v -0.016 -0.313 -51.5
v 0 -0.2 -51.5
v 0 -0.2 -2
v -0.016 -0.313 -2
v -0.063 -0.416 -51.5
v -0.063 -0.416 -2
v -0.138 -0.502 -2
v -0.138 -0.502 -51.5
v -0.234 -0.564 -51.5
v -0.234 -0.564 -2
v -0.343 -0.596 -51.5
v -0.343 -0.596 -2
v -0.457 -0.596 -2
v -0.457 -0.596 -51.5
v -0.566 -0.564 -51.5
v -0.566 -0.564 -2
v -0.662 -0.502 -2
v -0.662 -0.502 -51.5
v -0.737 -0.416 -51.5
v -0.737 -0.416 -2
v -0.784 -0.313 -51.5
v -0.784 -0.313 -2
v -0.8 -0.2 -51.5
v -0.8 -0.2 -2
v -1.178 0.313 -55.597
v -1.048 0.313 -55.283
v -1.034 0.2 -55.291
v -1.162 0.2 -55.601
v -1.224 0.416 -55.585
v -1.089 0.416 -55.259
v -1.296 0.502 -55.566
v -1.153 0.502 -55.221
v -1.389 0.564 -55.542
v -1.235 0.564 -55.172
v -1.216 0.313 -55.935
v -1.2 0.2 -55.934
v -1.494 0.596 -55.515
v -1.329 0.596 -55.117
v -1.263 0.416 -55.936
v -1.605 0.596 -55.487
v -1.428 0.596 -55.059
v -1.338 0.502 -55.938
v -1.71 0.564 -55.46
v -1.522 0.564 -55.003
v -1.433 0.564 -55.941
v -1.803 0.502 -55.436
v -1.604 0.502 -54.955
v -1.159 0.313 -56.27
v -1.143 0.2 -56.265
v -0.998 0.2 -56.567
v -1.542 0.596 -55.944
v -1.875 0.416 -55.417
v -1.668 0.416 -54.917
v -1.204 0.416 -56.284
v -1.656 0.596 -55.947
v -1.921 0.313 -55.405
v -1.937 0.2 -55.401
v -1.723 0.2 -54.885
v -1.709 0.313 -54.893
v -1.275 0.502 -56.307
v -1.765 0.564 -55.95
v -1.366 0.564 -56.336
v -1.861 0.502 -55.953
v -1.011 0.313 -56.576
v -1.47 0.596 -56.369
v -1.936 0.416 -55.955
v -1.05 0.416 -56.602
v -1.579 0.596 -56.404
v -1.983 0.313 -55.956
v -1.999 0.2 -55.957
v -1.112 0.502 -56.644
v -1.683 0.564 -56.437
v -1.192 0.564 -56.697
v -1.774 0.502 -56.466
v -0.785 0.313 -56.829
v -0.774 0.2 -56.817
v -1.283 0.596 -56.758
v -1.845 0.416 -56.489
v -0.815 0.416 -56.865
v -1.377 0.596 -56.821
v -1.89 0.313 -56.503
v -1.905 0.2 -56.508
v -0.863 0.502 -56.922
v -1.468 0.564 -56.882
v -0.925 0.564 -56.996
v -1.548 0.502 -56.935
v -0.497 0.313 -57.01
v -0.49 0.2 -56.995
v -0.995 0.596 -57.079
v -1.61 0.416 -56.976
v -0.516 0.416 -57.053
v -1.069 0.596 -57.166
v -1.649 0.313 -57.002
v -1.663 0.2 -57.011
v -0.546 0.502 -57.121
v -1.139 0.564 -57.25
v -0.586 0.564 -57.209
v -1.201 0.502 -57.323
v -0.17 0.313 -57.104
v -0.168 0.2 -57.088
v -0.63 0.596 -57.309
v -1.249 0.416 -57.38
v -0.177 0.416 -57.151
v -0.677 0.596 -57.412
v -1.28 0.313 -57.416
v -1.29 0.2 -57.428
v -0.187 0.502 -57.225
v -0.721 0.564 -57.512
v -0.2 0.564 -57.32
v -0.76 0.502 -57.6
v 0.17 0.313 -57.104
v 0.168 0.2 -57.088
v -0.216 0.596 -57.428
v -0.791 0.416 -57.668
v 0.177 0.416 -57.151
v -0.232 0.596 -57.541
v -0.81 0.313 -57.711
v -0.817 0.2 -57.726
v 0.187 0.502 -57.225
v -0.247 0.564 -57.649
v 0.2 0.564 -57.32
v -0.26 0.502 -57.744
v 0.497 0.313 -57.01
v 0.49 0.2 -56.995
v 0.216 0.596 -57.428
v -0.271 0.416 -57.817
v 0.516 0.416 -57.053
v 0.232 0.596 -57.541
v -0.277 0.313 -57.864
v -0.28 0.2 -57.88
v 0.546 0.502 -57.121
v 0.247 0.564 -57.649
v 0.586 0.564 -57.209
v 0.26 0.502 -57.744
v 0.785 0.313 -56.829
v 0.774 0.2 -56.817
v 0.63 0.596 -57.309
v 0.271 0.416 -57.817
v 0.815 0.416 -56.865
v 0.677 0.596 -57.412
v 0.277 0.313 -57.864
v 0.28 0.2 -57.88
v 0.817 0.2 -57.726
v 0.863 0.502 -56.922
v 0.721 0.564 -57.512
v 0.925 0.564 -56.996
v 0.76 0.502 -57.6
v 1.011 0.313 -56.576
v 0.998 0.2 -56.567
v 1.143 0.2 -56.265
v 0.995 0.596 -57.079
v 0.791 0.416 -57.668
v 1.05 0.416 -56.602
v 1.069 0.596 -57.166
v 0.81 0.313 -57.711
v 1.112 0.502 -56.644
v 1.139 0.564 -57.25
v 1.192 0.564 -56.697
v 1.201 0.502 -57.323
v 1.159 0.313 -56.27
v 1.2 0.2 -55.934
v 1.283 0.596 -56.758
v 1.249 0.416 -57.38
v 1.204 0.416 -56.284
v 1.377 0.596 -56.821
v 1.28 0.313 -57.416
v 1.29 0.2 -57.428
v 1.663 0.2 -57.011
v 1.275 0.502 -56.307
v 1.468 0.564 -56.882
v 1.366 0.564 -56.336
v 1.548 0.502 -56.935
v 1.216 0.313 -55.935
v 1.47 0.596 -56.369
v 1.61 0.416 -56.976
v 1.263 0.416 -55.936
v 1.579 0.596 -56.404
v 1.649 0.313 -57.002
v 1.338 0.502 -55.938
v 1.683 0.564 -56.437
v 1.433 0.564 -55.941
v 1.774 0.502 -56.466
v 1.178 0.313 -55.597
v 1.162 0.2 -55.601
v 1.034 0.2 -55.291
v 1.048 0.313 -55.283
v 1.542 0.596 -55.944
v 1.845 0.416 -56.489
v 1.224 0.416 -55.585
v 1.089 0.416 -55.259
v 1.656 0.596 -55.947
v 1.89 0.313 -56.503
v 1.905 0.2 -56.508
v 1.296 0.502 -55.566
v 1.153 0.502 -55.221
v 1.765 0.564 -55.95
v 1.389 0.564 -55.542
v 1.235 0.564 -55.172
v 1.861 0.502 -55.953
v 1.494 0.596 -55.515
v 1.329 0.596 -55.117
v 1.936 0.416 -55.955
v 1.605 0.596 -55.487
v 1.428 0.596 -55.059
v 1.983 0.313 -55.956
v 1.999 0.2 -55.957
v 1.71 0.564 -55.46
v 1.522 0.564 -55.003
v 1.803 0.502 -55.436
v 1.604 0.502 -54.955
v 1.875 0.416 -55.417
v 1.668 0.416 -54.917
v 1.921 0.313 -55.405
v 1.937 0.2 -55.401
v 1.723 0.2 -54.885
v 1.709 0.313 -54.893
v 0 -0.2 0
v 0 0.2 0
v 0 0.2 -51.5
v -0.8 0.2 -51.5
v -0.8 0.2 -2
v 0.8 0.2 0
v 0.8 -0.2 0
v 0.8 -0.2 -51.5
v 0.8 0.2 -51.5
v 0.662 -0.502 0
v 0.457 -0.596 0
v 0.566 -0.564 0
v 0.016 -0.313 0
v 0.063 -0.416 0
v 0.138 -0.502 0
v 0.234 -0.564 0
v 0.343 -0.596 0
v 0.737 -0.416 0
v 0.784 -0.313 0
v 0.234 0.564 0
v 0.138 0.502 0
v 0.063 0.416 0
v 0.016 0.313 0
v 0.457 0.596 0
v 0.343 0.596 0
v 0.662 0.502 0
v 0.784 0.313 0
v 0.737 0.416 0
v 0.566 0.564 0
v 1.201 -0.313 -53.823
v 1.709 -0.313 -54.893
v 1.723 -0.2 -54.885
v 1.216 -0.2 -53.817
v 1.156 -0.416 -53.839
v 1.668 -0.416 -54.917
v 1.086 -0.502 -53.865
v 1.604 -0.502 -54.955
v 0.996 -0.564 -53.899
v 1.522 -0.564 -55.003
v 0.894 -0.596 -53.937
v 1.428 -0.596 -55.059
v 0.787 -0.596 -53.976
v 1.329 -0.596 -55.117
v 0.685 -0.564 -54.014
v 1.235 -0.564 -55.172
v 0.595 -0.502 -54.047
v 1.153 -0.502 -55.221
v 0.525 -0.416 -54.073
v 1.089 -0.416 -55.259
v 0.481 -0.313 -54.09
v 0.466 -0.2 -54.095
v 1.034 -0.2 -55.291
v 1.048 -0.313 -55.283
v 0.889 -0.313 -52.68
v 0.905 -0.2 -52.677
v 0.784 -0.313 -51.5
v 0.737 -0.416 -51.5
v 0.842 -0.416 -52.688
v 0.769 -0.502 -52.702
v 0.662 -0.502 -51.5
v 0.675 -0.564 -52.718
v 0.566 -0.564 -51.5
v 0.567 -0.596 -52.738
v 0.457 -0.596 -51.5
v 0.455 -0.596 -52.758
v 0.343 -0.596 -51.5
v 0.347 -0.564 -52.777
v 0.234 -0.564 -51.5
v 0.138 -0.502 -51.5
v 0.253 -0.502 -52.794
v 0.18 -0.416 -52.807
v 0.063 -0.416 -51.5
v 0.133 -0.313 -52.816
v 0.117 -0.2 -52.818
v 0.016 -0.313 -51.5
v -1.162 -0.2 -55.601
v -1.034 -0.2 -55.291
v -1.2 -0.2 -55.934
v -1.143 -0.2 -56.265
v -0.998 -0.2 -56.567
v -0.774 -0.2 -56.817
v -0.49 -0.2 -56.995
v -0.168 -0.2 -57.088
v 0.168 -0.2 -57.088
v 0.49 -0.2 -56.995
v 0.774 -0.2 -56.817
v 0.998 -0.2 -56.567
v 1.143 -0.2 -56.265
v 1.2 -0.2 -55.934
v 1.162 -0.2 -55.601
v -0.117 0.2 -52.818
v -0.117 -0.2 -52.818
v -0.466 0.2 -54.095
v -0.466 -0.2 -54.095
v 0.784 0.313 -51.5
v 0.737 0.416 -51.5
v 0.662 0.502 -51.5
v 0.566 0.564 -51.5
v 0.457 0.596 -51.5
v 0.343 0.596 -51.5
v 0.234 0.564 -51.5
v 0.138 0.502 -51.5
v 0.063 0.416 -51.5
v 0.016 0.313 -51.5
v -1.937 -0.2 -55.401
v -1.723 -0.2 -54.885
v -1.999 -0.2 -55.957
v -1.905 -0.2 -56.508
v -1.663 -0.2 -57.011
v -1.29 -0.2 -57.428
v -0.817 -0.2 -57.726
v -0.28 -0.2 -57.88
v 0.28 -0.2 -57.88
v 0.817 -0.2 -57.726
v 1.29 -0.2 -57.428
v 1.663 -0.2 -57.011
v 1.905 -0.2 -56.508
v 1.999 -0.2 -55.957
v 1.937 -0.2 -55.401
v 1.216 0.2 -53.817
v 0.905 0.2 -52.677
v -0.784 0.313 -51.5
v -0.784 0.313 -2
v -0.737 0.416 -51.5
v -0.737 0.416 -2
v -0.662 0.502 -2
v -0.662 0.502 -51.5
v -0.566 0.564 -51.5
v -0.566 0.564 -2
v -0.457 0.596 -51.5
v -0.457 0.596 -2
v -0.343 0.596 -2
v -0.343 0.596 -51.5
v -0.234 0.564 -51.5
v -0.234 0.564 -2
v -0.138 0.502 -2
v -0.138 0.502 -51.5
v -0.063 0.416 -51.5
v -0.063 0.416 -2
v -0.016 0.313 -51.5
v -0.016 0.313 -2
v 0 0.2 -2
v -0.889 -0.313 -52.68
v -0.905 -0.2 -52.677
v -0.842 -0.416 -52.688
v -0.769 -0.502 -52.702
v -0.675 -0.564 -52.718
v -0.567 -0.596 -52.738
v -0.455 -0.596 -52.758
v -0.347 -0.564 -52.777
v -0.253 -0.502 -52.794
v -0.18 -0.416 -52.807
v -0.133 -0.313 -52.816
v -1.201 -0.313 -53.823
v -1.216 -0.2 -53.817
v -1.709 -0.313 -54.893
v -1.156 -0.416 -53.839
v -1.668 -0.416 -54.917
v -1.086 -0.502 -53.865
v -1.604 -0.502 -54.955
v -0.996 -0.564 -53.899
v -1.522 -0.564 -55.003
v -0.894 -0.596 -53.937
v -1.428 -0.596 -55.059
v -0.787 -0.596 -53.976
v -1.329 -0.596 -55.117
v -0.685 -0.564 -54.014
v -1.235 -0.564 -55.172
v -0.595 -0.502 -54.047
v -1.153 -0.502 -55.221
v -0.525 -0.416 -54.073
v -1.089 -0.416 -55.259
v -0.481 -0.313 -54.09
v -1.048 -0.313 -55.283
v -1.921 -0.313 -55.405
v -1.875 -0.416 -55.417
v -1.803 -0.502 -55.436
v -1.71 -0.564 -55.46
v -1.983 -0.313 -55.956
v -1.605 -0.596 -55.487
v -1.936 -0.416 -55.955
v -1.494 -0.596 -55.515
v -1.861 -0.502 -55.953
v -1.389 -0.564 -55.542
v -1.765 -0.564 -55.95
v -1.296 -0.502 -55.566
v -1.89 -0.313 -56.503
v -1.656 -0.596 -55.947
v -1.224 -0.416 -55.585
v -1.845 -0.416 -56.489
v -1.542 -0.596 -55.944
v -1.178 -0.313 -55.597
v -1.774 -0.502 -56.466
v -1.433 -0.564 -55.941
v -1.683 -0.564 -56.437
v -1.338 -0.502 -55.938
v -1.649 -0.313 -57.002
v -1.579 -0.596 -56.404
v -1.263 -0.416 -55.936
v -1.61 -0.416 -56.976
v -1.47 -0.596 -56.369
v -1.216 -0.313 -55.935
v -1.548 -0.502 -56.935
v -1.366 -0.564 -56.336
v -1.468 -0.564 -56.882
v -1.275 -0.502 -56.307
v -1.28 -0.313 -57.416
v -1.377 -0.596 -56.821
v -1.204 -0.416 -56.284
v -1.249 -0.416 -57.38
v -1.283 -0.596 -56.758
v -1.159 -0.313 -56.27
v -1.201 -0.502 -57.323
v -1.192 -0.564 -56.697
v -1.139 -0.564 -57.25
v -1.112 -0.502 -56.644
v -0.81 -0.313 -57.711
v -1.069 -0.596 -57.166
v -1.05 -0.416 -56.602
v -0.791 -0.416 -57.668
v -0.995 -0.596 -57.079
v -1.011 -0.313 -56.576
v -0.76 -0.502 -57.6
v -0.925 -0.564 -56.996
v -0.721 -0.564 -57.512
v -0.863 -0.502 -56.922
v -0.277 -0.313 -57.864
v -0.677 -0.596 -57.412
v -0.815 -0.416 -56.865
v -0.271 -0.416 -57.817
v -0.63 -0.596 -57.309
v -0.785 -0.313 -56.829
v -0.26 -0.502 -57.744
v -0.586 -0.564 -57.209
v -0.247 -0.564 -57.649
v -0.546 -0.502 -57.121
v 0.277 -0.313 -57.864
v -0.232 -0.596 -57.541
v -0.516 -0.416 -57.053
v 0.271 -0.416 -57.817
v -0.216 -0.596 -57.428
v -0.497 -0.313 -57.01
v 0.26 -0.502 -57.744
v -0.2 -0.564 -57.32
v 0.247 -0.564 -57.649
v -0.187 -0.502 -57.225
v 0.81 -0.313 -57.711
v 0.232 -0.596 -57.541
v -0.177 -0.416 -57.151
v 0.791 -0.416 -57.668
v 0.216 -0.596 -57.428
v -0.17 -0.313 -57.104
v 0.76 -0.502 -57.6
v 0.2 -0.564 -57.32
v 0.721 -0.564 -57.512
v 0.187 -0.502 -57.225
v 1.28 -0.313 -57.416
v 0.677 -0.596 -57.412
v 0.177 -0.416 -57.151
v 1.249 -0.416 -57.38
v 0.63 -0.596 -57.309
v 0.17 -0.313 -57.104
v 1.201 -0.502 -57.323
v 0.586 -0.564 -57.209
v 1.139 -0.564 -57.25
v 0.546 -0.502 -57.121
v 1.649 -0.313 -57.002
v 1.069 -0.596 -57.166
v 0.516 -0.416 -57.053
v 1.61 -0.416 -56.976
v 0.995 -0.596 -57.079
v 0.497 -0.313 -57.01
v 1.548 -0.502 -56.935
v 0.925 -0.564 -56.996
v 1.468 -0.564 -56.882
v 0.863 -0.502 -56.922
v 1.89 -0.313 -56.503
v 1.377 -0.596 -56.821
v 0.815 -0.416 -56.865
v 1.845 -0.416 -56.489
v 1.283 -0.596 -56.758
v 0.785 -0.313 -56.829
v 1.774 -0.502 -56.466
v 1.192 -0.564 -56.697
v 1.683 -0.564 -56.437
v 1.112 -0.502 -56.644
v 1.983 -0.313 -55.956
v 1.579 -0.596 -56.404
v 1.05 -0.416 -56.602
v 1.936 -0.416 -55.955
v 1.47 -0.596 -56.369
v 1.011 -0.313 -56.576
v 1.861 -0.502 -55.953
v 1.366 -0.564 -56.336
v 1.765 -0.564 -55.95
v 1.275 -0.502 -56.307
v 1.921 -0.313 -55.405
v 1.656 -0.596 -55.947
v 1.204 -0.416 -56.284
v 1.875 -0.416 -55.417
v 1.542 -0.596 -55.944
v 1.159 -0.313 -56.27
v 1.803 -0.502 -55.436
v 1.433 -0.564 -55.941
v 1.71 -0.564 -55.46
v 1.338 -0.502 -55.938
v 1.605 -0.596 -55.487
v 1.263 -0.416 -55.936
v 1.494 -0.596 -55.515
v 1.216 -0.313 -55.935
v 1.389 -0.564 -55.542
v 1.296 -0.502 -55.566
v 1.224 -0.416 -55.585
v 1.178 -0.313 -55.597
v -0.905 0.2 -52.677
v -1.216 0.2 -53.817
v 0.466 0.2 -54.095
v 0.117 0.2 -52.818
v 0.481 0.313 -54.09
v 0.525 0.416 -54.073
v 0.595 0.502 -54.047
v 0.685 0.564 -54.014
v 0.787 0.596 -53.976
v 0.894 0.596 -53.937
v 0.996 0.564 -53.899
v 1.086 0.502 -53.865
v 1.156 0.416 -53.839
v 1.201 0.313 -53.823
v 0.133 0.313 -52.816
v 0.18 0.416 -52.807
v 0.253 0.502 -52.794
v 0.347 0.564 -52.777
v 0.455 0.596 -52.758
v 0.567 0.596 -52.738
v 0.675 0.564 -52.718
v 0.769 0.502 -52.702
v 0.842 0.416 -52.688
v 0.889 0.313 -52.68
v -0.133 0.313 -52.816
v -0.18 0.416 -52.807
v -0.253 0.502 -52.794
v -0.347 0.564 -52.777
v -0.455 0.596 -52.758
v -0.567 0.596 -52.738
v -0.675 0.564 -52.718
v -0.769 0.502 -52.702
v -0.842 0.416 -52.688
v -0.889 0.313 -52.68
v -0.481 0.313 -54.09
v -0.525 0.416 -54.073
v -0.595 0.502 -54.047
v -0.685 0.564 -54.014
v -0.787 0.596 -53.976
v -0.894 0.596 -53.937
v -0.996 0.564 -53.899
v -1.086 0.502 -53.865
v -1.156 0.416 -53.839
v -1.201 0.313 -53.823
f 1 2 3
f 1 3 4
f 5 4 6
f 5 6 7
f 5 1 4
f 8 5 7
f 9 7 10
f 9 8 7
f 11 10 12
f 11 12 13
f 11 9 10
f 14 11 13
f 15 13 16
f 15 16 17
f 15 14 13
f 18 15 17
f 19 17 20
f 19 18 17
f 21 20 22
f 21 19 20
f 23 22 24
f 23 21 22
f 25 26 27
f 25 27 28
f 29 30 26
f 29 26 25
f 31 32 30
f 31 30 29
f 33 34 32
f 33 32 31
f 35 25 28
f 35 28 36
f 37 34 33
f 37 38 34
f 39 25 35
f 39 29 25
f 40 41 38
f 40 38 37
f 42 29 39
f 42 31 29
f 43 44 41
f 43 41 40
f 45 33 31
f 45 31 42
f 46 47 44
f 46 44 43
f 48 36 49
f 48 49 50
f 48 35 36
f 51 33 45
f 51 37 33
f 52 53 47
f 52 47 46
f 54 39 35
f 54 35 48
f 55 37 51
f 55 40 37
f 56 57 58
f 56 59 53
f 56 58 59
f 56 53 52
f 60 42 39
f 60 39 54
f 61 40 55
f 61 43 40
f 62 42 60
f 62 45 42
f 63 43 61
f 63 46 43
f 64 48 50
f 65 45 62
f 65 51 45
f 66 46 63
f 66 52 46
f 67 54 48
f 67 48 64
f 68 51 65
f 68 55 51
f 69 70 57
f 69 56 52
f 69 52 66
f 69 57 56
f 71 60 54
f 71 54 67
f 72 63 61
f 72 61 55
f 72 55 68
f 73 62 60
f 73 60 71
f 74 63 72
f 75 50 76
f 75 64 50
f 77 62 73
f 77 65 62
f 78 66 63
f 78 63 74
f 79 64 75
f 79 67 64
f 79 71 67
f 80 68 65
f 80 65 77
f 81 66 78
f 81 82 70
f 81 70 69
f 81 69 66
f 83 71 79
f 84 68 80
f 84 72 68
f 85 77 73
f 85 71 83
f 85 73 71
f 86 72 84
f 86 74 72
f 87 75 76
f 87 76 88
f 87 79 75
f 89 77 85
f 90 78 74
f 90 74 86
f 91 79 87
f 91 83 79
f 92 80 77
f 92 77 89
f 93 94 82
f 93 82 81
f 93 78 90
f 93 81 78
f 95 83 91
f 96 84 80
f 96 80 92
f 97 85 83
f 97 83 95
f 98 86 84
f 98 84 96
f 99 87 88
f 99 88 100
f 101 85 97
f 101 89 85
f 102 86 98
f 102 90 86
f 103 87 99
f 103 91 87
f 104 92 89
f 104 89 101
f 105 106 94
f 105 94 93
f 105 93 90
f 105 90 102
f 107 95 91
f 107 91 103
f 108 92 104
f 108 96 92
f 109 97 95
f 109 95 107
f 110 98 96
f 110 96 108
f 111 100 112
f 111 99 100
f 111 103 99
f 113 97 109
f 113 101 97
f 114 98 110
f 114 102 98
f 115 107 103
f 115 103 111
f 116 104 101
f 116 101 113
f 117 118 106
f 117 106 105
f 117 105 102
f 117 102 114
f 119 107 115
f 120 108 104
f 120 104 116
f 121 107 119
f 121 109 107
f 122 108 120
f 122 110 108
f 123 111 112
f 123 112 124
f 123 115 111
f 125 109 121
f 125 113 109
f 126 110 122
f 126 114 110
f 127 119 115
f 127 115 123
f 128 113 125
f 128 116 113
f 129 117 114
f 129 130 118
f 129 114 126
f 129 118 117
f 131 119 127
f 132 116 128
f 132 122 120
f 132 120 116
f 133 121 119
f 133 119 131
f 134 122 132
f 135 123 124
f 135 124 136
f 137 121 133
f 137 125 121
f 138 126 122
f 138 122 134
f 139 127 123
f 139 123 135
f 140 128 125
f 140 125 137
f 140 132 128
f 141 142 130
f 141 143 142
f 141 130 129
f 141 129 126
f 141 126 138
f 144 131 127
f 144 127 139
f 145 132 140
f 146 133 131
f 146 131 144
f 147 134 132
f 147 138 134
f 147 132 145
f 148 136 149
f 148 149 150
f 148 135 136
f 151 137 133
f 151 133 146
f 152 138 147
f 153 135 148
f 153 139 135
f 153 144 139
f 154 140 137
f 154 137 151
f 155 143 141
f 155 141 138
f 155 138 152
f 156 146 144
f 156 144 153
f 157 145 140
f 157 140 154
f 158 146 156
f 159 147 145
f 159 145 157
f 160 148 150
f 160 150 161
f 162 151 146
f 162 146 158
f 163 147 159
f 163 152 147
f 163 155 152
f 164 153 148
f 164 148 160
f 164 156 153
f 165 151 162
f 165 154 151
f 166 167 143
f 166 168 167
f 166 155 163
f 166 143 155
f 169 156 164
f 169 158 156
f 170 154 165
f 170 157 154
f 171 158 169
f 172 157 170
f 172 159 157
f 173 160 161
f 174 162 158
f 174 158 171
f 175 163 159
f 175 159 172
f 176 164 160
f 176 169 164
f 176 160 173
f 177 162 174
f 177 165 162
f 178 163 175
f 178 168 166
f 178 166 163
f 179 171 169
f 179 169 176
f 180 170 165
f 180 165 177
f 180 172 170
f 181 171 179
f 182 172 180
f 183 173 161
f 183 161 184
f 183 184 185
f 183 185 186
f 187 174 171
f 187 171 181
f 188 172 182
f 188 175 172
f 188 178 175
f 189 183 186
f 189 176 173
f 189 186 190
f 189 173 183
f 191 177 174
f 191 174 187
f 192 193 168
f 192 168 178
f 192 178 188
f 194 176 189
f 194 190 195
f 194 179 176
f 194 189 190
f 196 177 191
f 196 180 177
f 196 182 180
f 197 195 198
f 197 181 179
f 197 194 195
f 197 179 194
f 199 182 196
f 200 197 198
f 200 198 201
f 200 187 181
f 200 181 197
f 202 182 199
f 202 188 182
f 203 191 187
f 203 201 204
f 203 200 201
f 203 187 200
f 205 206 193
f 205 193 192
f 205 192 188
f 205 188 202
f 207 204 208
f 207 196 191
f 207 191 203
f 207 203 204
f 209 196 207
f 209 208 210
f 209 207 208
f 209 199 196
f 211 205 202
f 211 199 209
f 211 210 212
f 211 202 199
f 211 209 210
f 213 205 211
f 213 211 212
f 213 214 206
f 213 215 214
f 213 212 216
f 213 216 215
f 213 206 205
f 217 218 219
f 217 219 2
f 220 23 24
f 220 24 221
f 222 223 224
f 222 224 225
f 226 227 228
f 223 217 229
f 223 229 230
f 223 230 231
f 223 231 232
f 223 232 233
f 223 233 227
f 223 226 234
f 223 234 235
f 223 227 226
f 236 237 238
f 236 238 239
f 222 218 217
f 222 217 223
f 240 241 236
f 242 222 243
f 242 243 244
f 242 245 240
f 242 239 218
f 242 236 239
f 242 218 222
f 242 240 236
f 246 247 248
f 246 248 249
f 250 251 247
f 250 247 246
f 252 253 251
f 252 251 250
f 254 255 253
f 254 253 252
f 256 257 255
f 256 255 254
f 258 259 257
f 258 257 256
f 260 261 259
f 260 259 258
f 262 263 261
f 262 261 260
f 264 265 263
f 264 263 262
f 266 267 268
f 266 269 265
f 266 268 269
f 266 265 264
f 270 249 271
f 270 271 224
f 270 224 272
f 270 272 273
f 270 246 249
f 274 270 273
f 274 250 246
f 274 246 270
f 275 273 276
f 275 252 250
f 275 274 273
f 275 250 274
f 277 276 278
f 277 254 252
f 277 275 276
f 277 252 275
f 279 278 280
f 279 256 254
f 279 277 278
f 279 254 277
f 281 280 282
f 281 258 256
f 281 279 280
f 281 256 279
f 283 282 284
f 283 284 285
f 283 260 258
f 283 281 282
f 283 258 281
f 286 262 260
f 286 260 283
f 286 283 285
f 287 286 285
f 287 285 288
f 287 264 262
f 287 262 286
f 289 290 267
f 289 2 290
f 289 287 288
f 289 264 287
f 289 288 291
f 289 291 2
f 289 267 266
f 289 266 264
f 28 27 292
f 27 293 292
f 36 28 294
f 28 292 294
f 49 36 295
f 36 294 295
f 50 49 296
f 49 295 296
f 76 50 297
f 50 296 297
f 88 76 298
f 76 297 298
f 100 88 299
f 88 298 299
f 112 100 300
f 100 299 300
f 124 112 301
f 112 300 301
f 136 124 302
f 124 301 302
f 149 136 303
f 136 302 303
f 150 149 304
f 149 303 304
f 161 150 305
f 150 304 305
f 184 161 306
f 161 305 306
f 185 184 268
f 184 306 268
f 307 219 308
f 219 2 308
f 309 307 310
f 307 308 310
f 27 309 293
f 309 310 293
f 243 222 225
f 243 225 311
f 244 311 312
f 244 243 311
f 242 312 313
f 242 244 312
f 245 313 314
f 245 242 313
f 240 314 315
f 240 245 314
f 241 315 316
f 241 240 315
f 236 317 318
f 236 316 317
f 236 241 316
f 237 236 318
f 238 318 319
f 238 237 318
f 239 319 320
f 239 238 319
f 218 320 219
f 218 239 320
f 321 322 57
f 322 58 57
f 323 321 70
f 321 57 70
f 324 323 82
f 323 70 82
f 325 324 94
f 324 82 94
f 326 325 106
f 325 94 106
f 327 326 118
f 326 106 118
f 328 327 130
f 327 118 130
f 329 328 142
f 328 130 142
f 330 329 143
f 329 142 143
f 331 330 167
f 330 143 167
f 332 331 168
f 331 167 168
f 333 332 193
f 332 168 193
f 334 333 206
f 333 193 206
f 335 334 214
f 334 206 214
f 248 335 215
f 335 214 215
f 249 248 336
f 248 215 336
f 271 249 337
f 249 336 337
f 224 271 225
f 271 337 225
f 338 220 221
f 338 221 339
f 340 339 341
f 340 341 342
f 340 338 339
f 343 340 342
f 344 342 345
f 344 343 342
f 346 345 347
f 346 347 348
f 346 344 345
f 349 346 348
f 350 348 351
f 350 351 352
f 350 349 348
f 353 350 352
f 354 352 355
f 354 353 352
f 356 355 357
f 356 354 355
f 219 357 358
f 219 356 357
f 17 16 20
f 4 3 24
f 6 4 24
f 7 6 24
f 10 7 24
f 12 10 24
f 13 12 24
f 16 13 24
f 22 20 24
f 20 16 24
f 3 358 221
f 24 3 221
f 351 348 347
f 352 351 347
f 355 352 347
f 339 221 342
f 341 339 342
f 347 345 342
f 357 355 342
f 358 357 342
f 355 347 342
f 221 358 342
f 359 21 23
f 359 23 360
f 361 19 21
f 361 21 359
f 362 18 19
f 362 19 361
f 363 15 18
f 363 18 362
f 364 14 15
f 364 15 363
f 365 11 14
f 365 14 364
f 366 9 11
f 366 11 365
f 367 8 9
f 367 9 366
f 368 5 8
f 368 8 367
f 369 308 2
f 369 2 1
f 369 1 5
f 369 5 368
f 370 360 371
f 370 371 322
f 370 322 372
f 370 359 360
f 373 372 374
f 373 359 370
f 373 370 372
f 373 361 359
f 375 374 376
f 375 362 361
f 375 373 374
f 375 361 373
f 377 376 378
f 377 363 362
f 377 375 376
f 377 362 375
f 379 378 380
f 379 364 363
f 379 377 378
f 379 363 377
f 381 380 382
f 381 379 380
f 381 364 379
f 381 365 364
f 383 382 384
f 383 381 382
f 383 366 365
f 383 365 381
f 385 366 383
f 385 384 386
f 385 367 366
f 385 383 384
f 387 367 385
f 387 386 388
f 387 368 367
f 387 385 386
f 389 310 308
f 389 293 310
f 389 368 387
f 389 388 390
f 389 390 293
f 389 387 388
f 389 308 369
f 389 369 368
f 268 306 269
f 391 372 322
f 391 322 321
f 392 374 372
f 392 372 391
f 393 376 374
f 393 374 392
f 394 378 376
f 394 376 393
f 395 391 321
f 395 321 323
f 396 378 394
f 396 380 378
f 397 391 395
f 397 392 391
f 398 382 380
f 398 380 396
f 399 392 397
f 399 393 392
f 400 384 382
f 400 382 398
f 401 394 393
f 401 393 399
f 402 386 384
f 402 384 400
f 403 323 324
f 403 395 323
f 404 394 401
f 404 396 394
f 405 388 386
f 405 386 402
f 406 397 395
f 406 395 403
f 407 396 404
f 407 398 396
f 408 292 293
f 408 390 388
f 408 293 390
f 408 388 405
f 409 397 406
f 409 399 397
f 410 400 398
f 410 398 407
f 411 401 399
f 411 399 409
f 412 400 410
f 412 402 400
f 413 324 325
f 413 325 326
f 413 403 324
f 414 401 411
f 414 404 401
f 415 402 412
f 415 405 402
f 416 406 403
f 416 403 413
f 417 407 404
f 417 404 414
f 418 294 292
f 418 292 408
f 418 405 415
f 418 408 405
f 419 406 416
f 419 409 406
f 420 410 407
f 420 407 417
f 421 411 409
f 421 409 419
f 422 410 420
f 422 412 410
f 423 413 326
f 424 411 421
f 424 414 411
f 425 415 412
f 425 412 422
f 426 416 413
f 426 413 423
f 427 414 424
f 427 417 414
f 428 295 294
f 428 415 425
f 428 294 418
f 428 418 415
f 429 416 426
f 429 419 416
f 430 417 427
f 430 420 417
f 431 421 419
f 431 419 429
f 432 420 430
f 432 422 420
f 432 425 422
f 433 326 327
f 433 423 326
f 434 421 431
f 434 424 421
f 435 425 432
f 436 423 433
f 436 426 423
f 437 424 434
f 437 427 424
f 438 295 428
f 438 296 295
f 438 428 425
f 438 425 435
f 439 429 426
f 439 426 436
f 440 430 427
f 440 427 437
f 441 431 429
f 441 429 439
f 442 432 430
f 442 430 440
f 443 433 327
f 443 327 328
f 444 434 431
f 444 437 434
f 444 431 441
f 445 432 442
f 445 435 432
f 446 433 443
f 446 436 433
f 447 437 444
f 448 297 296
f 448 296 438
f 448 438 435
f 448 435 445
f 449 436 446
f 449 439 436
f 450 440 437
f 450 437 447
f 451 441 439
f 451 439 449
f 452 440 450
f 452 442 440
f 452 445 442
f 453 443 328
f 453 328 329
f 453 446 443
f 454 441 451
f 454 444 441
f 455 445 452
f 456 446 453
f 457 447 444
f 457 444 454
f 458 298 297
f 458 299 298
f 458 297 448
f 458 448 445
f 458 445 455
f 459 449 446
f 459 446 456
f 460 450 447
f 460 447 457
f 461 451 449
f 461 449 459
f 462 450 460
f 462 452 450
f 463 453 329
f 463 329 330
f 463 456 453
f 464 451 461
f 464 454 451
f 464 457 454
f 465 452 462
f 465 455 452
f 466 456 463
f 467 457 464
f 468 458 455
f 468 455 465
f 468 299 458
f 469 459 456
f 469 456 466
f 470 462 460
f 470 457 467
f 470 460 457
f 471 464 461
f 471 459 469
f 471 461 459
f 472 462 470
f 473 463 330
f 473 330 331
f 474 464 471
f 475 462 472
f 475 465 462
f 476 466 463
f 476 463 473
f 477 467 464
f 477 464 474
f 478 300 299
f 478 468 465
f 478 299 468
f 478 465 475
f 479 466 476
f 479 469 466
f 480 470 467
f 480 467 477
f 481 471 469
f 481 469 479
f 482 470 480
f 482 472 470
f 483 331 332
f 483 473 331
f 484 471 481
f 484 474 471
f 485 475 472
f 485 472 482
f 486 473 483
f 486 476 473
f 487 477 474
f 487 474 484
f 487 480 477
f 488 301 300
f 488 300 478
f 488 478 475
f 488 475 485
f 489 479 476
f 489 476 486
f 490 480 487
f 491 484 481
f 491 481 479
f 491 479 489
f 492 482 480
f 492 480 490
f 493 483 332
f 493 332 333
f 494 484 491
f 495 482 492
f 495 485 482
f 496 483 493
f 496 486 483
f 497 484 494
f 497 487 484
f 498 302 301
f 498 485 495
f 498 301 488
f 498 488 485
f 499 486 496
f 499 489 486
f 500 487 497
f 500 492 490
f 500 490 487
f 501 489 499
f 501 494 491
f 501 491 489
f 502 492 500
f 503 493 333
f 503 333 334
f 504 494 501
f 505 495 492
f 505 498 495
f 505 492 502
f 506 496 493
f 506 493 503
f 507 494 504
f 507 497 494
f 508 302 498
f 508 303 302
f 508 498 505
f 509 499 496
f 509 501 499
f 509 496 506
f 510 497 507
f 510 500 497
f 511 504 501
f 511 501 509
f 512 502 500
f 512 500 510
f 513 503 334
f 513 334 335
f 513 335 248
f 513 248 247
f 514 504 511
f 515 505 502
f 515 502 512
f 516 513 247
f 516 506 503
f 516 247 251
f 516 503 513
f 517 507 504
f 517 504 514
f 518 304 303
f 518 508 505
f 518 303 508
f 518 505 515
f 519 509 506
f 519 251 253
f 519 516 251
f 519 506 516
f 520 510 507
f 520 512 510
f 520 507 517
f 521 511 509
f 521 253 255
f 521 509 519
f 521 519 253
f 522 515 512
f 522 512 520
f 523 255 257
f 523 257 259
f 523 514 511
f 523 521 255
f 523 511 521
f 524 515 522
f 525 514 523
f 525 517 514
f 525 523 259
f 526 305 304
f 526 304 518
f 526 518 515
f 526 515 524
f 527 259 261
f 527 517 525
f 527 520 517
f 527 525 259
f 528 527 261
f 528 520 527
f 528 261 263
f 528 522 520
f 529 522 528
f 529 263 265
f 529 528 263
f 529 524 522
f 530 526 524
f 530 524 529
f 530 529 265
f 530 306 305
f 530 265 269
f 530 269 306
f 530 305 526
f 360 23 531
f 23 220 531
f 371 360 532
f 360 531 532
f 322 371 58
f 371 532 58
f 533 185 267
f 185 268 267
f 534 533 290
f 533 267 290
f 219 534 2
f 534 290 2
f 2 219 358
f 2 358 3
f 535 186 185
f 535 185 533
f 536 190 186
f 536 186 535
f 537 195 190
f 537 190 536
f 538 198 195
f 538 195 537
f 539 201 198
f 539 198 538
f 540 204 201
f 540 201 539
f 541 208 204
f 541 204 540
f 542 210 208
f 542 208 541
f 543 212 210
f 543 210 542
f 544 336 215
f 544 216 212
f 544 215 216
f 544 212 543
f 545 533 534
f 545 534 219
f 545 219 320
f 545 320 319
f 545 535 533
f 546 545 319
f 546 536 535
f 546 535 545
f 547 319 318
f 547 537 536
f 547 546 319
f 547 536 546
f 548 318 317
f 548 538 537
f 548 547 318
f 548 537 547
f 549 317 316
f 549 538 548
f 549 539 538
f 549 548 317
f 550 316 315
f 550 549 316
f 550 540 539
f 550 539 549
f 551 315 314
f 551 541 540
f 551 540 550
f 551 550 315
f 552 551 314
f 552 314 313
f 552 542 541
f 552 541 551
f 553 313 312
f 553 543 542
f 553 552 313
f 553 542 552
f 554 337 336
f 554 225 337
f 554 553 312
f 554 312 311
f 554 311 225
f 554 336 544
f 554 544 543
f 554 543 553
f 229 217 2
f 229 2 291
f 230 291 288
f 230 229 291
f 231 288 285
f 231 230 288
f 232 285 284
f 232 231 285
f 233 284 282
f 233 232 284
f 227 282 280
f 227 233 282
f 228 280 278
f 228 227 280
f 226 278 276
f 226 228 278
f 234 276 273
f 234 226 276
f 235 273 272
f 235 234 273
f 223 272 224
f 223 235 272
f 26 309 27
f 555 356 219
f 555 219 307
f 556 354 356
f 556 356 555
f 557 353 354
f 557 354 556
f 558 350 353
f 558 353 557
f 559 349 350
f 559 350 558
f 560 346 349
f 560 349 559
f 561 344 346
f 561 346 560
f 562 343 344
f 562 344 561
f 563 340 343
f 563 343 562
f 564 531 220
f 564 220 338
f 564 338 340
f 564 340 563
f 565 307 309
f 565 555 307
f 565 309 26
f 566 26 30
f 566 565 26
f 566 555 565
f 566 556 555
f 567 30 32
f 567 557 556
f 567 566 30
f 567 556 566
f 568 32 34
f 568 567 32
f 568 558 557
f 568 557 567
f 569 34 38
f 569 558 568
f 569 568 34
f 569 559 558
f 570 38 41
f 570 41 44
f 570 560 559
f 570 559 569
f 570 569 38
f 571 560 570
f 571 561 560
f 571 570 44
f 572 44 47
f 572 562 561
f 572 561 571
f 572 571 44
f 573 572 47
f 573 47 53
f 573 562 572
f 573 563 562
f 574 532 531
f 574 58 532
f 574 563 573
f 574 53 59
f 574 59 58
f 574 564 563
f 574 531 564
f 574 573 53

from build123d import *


with BuildPart() as part:
    # Sweep1: sweep along a path in Sketch1
    with BuildLine(Plane(origin=(0, 0, 0), x_dir=(1, 0, 0), z_dir=(0, 1, 0))) as sweep1_path:
        Line((-0.4, 2), (-0.4, 51.5))
        ThreePointArc((-0.4, 51.5), (-0.64900233, 53.359363001), (-1.378461538, 55.087692308))
        ThreePointArc((-1.378461538, 55.087692308), (0, 57.5), (1.378461538, 55.087692308))
        ThreePointArc((1.378461538, 55.087692308), (0.64900233, 53.359363001), (0.4, 51.5))
        Line((0.4, 51.5), (0.4, 0))
    # Sketch2 → Sweep1 (sweep)
    with BuildSketch(Plane.XY):
        with BuildLine():
            Line((0, -0.2), (0, 0.2))
            ThreePointArc((0, 0.2), (0.4, 0.6), (0.8, 0.2))
            Line((0.8, 0.2), (0.8, -0.2))
            ThreePointArc((0.8, -0.2), (0.4, -0.6), (0, -0.2))
        make_face()
    sweep(path=sweep1_path.line)


solid = part.part
